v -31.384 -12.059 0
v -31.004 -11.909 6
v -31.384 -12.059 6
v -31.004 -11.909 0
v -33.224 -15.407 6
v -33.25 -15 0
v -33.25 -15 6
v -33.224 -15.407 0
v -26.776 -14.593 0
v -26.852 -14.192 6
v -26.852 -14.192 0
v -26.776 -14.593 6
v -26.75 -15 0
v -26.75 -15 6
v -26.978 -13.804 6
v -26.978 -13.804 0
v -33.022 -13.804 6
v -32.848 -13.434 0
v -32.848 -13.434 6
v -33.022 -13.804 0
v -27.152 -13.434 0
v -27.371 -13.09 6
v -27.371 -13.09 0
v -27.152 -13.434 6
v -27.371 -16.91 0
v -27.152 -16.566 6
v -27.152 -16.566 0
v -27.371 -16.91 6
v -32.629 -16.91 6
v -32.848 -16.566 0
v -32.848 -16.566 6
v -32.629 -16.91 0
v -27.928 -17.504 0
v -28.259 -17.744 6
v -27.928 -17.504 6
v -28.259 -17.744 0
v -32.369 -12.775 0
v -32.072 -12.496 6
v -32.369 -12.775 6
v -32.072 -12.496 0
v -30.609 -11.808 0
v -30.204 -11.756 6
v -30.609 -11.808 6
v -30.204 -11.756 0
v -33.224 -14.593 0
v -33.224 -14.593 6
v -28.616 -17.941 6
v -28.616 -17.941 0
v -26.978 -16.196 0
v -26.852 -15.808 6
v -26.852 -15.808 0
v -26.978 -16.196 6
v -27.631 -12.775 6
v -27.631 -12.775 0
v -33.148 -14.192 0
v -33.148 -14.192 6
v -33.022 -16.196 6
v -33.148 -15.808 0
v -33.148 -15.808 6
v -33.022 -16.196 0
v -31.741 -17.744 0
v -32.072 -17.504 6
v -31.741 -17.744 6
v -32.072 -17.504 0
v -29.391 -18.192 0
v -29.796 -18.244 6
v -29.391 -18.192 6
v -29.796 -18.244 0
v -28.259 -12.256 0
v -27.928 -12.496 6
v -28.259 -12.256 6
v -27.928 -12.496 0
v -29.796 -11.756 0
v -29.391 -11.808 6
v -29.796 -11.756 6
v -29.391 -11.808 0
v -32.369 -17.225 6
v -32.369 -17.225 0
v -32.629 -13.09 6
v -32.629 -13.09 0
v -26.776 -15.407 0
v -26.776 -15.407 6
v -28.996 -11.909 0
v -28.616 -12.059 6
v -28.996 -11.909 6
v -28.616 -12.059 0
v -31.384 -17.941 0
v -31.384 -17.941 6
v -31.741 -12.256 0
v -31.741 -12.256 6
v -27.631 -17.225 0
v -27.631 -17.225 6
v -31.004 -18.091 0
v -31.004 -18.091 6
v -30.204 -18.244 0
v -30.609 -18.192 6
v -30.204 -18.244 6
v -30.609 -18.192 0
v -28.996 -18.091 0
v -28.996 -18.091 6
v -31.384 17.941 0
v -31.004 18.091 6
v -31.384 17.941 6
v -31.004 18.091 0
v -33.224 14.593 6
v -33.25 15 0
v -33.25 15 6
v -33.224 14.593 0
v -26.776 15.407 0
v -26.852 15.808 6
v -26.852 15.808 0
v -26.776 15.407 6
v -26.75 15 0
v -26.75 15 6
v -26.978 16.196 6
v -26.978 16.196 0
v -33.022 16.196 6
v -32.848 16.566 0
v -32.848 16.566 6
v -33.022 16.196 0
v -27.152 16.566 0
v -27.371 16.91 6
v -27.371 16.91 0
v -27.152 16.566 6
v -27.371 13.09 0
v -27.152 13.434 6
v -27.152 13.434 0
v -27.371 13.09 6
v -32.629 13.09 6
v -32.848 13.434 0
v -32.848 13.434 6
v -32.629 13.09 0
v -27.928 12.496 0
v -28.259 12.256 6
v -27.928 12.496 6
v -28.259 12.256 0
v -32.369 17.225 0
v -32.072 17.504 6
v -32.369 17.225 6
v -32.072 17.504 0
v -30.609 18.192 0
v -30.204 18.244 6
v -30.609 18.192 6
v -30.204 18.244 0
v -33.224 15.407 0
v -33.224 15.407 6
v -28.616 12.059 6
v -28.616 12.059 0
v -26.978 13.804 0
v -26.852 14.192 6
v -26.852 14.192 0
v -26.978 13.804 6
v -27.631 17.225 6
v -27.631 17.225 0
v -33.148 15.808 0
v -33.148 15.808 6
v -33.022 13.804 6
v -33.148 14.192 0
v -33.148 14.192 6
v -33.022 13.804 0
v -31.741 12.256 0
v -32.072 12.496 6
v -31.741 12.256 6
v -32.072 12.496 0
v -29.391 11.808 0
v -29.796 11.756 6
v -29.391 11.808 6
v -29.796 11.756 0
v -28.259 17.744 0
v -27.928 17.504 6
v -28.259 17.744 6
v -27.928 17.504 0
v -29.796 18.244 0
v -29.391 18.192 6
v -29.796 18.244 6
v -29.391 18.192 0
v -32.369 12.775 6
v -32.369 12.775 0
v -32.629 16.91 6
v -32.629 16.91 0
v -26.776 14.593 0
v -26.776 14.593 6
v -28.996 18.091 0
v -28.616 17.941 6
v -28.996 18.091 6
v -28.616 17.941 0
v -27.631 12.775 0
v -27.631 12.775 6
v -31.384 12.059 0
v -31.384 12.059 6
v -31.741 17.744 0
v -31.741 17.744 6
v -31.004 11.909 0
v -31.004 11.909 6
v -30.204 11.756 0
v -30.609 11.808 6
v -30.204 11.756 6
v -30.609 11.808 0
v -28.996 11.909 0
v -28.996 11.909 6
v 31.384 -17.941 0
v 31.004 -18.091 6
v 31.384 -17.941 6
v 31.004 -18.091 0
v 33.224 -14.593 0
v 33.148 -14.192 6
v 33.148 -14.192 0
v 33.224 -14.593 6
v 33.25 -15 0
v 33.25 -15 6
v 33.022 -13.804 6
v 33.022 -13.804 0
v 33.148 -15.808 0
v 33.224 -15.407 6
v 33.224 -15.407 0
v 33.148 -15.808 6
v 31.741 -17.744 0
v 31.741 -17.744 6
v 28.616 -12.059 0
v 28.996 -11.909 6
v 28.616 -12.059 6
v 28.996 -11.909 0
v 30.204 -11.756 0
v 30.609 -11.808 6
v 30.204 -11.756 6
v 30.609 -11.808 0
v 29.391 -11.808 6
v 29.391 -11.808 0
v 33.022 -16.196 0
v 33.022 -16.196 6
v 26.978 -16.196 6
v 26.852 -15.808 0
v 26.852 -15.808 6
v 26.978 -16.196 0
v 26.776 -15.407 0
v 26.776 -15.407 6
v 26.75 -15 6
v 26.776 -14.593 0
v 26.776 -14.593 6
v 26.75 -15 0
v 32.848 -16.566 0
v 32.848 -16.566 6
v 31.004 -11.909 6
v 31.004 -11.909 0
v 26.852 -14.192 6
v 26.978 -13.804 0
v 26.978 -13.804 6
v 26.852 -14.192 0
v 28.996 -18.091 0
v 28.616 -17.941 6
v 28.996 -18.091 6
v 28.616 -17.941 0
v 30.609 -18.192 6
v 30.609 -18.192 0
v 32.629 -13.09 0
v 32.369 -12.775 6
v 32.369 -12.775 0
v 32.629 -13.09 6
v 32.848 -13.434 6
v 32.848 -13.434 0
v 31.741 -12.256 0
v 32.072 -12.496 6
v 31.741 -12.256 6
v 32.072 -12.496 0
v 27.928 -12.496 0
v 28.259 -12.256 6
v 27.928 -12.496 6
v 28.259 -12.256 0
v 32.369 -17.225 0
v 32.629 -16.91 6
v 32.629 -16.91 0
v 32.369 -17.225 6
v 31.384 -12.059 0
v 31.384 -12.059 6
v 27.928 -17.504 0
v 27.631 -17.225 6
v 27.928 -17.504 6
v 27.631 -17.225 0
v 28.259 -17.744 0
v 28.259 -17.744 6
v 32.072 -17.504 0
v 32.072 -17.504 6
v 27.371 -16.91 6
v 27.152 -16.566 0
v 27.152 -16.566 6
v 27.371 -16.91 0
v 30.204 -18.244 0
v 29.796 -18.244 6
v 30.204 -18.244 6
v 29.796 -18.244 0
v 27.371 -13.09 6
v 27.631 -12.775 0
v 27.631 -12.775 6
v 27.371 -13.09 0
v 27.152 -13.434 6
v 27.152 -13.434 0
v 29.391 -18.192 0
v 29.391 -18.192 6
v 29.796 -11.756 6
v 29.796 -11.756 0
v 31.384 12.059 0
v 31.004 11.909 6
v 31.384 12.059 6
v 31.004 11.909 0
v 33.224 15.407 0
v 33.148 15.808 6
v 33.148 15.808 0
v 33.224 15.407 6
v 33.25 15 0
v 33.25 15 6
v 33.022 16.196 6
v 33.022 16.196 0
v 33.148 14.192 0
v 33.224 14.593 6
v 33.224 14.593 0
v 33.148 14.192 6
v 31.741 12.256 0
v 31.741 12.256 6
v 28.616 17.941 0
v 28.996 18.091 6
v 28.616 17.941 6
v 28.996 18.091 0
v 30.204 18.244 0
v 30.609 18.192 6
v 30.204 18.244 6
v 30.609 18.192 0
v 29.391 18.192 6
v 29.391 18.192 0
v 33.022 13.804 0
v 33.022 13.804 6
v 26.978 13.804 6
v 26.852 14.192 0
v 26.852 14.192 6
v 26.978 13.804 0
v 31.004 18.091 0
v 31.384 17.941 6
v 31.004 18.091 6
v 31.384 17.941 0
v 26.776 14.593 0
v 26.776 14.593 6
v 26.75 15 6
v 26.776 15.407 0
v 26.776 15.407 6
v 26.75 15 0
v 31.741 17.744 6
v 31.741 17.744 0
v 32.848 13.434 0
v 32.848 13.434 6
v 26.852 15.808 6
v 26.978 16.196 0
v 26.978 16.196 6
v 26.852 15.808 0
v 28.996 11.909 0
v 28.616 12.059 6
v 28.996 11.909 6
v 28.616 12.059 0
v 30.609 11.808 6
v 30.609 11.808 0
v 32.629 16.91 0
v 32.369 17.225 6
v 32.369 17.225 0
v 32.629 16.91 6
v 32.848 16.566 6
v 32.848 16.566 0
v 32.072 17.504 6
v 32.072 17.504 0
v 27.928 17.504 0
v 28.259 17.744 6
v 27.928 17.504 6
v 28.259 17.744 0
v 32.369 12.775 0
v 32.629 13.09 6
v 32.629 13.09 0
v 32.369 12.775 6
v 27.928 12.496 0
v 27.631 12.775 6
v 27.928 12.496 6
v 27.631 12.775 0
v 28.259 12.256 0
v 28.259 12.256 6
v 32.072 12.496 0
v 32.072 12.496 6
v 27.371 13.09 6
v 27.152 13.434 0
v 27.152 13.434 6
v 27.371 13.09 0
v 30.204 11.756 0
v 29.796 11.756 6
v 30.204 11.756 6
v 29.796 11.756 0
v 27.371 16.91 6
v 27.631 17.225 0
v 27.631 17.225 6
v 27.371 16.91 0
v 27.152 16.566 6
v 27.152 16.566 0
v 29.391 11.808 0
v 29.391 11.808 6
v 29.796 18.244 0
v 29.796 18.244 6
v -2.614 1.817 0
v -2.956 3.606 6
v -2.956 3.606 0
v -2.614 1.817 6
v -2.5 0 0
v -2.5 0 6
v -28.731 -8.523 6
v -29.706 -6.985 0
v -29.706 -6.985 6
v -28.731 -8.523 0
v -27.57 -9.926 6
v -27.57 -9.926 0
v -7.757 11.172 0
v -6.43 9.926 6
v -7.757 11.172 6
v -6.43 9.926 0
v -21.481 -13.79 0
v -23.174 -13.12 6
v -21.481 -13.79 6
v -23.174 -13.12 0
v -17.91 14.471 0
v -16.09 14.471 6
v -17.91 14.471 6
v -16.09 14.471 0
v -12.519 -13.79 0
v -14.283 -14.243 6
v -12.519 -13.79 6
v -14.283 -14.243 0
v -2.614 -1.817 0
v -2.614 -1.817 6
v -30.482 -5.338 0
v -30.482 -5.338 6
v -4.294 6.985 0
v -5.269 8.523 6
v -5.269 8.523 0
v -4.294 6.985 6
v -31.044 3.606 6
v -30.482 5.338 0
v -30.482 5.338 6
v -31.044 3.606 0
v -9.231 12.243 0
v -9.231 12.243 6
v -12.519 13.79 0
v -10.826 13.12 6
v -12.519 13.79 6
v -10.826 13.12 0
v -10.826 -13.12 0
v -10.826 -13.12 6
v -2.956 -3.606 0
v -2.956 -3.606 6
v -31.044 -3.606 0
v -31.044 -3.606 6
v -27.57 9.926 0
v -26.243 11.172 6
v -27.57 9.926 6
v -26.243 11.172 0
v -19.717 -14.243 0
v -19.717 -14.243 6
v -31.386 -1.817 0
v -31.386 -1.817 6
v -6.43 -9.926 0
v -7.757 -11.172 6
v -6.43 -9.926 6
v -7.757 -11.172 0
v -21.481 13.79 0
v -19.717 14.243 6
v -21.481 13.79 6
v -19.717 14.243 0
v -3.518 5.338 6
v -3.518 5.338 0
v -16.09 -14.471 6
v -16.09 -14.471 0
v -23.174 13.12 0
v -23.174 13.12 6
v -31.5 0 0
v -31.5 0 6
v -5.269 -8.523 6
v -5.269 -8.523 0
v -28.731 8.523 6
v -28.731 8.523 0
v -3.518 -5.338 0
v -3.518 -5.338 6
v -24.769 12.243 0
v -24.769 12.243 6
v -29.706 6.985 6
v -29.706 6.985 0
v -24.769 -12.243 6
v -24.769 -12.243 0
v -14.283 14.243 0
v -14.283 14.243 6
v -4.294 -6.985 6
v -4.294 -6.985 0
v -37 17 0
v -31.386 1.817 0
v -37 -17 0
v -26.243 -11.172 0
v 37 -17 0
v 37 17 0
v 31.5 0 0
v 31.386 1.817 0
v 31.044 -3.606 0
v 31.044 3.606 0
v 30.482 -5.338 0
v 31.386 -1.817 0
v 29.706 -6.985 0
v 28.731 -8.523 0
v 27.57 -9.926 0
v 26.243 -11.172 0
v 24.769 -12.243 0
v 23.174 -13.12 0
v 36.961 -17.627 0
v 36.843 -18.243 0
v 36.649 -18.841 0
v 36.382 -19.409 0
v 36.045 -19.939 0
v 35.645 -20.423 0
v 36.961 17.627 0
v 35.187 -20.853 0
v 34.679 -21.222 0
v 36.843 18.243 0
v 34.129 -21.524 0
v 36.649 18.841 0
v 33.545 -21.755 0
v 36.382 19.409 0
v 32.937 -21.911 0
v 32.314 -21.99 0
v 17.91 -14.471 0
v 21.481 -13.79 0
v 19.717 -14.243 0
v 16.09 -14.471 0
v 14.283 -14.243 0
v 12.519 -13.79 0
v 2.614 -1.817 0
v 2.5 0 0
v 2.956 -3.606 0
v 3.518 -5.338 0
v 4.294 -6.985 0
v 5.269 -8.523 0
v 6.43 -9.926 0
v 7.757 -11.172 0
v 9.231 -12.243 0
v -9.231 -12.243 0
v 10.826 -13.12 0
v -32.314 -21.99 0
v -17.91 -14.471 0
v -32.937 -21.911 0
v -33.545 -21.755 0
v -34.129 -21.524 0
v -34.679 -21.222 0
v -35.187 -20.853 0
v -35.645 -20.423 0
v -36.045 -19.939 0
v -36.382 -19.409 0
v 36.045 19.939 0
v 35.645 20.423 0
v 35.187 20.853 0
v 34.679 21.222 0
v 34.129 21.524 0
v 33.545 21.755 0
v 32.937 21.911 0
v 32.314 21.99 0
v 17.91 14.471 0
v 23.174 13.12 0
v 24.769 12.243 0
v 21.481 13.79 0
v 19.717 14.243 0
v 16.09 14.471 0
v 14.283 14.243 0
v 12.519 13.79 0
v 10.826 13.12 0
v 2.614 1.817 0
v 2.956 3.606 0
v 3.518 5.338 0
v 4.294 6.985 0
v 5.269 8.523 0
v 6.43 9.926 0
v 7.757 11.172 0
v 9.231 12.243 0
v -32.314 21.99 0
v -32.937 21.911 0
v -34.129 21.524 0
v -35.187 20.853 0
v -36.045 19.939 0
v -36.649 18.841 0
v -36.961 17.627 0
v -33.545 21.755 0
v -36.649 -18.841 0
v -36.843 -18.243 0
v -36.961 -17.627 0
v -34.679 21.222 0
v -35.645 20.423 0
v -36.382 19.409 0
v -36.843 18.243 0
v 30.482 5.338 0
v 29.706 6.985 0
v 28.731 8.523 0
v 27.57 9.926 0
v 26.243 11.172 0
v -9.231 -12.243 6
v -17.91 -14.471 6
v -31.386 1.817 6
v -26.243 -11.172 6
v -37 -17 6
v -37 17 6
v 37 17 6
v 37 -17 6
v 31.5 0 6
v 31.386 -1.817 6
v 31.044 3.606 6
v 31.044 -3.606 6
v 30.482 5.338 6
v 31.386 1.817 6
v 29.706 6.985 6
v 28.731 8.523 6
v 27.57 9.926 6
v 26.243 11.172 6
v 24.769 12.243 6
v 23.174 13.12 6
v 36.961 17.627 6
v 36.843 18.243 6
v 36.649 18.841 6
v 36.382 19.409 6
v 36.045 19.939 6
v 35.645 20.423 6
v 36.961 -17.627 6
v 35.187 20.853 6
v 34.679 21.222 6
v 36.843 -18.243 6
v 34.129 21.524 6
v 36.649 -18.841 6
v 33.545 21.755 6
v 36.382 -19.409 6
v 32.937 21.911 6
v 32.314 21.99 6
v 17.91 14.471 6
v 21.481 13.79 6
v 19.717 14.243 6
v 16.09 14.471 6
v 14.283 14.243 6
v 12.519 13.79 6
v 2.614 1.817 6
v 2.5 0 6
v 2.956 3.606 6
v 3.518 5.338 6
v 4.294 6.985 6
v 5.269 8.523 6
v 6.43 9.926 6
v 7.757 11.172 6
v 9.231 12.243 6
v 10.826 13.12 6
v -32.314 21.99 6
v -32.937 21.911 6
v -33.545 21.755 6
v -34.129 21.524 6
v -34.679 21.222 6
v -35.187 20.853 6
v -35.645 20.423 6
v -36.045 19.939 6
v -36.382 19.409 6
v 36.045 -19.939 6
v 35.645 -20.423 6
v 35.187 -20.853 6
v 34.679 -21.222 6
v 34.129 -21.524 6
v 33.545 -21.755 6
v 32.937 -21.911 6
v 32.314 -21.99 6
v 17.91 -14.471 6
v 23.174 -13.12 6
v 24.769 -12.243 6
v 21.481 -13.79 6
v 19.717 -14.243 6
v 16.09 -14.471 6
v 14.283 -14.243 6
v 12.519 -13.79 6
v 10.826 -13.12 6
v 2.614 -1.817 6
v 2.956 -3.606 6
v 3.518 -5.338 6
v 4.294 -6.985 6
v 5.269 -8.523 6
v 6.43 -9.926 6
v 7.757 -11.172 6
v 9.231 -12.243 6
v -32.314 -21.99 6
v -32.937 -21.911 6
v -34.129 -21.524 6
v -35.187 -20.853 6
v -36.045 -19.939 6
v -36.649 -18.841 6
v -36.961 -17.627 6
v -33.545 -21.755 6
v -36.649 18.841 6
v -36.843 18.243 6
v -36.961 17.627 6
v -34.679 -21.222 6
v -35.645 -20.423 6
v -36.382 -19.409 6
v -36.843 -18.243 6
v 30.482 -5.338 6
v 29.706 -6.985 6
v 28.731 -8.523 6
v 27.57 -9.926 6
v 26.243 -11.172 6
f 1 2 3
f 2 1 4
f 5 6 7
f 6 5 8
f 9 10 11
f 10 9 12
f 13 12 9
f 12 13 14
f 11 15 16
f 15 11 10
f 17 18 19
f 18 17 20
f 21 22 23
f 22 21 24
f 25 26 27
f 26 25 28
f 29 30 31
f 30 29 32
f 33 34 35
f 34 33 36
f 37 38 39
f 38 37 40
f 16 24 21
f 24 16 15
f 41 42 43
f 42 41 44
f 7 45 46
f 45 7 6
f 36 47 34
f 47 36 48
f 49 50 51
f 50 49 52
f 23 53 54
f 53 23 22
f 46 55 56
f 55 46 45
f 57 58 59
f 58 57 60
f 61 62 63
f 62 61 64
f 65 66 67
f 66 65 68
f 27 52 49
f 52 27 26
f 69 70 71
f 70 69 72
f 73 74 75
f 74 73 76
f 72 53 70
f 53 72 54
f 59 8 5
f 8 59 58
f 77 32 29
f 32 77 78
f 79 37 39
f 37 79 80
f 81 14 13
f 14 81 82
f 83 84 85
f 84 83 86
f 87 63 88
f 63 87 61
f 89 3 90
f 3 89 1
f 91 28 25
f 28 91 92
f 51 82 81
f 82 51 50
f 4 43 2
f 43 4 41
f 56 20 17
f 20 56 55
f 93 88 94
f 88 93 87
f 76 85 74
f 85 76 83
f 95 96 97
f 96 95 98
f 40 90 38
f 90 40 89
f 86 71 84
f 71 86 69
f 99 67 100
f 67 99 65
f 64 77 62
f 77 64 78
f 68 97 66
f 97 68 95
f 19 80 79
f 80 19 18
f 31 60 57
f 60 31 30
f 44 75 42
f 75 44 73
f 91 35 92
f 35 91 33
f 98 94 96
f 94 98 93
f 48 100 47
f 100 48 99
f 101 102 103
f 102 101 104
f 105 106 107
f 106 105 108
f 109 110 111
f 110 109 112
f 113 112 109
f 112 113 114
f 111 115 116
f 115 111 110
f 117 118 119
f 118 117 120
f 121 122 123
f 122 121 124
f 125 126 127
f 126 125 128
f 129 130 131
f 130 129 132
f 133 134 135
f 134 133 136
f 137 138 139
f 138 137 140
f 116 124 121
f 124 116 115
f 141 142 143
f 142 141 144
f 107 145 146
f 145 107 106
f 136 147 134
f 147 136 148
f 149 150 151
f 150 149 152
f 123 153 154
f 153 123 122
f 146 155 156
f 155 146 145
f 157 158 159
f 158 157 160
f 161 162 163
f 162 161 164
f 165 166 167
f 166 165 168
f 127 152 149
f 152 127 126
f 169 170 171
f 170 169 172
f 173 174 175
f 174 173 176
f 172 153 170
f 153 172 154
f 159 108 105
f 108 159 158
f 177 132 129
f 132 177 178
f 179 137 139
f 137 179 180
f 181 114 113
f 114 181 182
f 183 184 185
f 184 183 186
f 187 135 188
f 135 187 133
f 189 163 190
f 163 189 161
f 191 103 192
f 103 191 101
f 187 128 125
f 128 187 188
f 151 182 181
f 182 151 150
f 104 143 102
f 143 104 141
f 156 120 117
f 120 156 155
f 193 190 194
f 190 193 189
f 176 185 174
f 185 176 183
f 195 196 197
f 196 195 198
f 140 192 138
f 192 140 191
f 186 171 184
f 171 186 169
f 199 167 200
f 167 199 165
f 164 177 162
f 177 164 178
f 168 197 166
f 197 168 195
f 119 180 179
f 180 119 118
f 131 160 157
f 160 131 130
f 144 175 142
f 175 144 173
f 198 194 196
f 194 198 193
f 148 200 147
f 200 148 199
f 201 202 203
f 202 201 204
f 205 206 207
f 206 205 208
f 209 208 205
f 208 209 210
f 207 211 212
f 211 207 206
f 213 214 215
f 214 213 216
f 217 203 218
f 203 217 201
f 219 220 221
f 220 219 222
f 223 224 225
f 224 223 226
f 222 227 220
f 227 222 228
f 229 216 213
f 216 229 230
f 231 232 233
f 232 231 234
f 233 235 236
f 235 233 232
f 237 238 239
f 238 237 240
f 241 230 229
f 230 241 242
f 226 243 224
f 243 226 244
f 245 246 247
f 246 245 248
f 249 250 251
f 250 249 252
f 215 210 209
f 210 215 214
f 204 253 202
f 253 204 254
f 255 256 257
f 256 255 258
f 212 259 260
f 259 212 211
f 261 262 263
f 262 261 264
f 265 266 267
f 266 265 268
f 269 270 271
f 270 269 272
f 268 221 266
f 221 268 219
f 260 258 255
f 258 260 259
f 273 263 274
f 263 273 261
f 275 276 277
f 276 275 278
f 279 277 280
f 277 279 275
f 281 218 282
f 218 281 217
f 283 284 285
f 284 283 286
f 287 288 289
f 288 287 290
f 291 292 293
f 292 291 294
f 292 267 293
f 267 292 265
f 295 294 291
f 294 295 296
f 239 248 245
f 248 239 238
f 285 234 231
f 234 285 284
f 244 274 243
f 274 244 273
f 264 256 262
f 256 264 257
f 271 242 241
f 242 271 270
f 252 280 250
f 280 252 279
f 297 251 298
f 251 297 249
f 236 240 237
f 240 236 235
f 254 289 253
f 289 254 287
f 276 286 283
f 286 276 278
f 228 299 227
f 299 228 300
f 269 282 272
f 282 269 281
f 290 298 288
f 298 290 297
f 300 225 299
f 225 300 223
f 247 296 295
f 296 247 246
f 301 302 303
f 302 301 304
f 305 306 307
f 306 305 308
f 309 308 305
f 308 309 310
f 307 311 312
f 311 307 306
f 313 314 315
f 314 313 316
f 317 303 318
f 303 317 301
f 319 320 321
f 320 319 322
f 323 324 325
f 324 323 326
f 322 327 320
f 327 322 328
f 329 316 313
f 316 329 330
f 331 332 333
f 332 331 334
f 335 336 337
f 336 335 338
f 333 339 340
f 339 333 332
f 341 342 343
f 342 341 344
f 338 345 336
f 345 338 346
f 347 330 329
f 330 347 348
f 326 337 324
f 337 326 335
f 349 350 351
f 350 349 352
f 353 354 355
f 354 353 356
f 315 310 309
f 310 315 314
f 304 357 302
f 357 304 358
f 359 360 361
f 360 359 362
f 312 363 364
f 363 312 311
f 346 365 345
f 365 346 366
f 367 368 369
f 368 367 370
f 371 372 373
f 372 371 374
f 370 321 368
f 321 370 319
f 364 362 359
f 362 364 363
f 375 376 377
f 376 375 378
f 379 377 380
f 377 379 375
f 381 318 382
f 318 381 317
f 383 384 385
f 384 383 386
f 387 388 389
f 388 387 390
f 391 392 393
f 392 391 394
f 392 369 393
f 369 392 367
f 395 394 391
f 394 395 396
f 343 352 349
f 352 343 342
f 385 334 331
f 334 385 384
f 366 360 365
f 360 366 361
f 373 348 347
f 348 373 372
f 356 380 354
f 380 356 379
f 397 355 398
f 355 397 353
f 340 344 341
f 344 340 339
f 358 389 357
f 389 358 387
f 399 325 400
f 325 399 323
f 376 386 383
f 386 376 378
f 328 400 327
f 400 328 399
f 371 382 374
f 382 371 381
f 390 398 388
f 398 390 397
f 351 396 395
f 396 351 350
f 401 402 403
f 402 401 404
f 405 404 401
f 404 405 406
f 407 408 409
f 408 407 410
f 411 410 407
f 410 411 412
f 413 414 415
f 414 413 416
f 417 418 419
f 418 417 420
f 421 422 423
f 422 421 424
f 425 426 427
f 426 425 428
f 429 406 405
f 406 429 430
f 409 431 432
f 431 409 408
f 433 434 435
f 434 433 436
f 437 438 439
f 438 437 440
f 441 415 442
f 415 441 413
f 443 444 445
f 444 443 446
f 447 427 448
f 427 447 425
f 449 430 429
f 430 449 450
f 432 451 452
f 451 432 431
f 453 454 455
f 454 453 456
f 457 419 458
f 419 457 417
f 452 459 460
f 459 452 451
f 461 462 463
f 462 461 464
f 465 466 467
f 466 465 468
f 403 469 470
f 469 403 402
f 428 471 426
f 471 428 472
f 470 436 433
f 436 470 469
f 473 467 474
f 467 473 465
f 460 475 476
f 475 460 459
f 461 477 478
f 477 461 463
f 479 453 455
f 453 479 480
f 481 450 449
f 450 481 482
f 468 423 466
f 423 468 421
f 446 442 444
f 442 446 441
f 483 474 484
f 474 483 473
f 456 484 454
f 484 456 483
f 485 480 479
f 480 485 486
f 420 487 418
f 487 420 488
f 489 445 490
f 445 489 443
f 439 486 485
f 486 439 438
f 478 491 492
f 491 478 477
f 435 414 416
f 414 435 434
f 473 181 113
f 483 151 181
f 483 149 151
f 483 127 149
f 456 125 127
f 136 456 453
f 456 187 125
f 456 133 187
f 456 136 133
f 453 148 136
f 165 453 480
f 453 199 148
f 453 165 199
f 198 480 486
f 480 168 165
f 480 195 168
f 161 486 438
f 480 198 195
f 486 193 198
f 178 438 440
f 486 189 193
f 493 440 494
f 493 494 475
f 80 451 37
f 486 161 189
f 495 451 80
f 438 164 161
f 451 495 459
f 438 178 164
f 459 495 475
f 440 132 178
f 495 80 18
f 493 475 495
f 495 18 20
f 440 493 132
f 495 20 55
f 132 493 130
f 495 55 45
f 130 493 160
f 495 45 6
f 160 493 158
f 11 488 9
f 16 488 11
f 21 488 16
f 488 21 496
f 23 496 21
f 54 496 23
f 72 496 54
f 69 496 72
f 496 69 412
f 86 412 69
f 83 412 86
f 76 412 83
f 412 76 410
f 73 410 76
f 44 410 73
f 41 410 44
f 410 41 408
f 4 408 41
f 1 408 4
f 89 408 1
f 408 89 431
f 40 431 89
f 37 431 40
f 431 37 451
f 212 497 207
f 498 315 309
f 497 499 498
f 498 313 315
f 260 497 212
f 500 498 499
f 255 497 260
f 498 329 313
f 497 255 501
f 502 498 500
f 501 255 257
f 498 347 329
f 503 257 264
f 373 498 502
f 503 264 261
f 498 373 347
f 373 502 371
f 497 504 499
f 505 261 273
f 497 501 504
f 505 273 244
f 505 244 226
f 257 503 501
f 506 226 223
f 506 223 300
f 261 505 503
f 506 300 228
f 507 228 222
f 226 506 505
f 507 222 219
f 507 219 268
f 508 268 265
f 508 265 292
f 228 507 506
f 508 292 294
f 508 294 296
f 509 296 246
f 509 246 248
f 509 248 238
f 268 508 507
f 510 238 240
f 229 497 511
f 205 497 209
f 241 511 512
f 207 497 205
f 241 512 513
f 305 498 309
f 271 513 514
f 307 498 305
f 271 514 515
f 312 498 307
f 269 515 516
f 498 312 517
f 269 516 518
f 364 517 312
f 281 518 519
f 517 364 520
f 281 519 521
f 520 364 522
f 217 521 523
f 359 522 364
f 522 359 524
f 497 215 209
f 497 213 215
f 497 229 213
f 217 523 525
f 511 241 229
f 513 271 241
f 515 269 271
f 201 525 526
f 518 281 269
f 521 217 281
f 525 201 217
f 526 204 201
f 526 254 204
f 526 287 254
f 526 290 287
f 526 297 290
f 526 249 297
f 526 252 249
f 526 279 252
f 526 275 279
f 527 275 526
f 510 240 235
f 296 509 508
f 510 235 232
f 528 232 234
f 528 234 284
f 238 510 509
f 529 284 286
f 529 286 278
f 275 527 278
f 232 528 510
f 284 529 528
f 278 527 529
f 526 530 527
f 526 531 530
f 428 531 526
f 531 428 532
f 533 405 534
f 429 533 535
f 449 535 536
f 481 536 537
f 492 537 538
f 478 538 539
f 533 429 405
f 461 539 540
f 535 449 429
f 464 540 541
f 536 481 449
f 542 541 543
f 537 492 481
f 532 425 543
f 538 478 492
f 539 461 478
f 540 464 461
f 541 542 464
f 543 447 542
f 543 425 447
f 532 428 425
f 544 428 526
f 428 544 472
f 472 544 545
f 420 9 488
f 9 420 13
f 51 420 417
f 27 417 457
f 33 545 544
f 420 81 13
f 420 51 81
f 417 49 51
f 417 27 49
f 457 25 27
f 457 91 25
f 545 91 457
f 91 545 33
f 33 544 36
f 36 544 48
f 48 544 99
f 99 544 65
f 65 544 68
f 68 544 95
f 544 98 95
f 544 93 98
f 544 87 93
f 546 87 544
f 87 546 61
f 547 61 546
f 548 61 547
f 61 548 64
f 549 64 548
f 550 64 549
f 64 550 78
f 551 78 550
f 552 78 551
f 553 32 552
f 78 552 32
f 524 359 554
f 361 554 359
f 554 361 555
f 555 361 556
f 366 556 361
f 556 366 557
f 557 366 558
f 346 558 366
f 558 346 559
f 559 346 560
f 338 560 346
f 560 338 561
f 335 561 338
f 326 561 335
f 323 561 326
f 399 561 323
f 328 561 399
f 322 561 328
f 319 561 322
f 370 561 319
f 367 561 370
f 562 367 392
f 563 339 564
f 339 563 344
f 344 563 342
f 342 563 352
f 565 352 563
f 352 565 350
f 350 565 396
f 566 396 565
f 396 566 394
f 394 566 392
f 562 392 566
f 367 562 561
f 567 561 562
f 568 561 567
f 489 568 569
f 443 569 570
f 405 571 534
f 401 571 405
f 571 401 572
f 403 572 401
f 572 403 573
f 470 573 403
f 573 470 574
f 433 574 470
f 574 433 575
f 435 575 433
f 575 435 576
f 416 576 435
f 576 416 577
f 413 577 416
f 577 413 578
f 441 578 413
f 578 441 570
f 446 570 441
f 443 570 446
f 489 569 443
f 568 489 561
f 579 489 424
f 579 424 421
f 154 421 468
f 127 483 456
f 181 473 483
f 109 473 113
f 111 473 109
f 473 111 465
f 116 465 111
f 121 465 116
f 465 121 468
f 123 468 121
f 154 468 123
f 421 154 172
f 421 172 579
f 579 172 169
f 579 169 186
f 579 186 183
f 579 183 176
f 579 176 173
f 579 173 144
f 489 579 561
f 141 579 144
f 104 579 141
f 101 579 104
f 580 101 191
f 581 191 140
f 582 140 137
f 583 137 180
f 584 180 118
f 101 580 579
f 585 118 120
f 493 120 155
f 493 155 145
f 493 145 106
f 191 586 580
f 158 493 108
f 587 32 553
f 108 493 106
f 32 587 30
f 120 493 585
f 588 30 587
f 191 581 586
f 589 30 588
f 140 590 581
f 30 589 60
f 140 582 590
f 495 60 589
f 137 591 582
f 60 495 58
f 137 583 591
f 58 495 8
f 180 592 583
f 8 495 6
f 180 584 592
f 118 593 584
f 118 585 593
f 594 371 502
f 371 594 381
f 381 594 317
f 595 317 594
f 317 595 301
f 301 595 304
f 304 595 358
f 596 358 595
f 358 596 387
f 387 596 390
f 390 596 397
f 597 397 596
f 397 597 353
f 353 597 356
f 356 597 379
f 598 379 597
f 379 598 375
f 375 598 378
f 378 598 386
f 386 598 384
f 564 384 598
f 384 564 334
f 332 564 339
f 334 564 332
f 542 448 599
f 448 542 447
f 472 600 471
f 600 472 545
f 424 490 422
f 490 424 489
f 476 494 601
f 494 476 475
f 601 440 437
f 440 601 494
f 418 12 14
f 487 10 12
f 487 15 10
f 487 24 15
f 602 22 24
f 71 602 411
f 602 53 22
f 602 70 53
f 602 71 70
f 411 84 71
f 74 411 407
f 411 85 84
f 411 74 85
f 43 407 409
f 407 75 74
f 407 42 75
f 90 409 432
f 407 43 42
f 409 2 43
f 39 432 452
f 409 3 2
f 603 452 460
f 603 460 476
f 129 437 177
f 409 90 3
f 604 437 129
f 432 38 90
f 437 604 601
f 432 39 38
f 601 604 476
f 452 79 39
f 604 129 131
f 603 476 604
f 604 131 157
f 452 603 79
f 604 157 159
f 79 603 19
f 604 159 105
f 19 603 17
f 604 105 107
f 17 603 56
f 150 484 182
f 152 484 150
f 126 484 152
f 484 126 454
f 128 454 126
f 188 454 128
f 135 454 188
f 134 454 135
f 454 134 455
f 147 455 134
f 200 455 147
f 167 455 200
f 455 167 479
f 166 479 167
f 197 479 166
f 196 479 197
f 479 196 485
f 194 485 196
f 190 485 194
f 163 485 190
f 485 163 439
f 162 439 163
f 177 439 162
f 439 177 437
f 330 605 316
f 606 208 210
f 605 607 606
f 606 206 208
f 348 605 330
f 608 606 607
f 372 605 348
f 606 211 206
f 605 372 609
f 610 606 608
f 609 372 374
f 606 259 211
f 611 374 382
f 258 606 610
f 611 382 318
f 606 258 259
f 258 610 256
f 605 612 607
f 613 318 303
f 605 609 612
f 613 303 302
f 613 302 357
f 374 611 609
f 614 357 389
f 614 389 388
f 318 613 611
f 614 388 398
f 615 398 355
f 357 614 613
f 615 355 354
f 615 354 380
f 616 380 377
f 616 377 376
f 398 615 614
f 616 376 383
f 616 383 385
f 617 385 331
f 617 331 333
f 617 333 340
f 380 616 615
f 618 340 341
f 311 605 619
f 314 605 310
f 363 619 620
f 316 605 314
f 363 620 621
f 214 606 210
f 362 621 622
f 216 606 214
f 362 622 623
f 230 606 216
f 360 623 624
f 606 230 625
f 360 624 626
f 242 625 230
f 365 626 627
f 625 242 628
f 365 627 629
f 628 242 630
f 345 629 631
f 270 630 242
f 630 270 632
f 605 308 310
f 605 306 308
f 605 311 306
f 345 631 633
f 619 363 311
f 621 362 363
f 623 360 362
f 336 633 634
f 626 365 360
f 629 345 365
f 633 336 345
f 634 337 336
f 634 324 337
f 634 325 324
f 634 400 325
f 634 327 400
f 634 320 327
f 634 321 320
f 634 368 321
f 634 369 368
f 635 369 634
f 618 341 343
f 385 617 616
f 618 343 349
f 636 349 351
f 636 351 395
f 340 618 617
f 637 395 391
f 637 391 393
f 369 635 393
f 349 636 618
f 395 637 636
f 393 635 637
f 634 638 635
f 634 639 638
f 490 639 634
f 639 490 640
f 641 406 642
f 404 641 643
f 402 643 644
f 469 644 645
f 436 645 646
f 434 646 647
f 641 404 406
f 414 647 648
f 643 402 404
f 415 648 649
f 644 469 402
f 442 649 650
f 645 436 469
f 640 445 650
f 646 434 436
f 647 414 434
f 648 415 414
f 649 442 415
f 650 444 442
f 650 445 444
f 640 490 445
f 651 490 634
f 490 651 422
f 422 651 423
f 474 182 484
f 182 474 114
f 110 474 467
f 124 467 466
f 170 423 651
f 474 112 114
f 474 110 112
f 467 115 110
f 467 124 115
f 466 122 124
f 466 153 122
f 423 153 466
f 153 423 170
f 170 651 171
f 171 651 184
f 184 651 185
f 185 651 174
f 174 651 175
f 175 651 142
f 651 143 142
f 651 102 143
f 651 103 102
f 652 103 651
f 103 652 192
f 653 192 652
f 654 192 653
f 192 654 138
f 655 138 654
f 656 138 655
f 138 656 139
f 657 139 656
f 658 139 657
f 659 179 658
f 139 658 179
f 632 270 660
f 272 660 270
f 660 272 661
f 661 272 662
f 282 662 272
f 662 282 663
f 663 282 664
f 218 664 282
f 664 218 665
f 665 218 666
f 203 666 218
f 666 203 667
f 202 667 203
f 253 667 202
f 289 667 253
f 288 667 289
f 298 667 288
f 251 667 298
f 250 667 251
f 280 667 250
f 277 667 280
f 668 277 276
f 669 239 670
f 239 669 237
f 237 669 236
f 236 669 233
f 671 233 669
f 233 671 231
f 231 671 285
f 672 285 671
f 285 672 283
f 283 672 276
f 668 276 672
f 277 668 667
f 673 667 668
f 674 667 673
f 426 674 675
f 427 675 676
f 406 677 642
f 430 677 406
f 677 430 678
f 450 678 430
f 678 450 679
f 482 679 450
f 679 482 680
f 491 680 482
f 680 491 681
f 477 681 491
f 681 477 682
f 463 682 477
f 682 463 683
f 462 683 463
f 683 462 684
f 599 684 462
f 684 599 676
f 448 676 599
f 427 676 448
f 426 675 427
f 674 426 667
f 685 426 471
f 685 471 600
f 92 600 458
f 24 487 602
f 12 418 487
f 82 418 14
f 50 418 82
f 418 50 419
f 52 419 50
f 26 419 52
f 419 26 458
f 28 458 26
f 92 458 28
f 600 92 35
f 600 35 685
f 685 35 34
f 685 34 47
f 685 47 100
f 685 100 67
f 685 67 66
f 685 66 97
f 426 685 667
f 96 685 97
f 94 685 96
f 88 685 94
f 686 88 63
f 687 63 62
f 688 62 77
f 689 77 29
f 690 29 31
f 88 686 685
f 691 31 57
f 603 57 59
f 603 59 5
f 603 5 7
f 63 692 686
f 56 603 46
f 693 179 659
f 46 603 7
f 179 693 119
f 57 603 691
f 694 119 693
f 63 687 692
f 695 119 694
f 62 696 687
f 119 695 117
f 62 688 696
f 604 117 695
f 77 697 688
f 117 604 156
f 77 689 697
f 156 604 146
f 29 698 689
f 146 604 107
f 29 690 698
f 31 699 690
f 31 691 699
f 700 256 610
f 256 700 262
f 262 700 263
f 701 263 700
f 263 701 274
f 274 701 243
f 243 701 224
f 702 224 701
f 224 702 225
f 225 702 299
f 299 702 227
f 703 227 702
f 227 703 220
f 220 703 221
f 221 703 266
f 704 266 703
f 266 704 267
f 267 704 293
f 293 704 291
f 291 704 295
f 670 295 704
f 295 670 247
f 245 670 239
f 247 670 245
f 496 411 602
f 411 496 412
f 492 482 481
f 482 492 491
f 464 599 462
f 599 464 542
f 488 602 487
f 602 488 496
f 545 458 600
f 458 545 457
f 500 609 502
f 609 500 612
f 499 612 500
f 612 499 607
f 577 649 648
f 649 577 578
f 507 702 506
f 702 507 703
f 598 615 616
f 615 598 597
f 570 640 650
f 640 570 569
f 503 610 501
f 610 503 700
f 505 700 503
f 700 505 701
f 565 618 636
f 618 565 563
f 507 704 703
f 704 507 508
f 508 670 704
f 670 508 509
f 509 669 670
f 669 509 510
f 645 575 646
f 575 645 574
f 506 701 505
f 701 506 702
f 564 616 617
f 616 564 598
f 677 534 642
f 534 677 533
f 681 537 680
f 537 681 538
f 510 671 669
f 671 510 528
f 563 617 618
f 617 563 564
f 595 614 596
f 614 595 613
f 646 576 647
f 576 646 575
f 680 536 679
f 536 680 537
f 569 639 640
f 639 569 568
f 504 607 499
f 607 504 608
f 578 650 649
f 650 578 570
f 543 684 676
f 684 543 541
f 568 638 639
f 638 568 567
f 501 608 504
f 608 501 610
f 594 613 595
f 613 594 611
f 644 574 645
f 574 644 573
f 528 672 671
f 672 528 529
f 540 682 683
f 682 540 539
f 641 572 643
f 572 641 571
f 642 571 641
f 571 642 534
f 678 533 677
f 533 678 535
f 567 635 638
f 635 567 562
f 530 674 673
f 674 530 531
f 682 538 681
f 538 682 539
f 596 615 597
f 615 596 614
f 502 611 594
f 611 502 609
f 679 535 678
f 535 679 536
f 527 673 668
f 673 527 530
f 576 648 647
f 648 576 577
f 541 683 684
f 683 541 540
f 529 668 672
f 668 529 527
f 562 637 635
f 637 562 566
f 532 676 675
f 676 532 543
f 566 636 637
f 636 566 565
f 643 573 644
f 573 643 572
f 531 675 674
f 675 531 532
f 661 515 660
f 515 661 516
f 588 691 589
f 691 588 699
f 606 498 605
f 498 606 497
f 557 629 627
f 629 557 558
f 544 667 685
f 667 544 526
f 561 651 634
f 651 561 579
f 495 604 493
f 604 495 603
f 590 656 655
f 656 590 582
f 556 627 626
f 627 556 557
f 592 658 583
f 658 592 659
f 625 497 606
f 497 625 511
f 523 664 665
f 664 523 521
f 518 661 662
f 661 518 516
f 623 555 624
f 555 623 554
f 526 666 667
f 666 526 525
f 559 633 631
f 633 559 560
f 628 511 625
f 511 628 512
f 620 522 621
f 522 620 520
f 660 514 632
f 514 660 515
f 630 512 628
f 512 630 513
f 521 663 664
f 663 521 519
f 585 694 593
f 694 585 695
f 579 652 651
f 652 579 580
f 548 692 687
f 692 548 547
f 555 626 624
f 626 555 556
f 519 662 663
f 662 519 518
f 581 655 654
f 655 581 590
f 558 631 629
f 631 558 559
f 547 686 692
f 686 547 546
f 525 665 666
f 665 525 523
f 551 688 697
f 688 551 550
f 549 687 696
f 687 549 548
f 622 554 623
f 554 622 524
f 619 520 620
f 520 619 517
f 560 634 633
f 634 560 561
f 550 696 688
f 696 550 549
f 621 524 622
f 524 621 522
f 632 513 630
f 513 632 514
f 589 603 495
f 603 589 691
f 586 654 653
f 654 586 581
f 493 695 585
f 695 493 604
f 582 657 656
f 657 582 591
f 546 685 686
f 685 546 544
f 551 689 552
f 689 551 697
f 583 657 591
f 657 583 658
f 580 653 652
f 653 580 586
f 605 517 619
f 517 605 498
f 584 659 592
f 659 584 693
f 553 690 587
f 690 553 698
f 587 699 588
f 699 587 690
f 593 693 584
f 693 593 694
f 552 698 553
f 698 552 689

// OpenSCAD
$fn = 50;

difference() {
	union() {
		hull() {
			translate(v = [-32.0, 17.0, 0]) {
				cylinder(h = 6, r = 5);
			}
			translate(v = [32.0, 17.0, 0]) {
				cylinder(h = 6, r = 5);
			}
			translate(v = [-32.0, -17.0, 0]) {
				cylinder(h = 6, r = 5);
			}
			translate(v = [32.0, -17.0, 0]) {
				cylinder(h = 6, r = 5);
			}
		}
	}
	union() {
		translate(v = [-30.0, -15.0, -100.0]) {
			cylinder(h = 200, r = 3.25);
		}
		translate(v = [-30.0, 15.0, -100.0]) {
			cylinder(h = 200, r = 3.25);
		}
		translate(v = [30.0, -15.0, -100.0]) {
			cylinder(h = 200, r = 3.25);
		}
		translate(v = [30.0, 15.0, -100.0]) {
			cylinder(h = 200, r = 3.25);
		}
		translate(v = [-30.0, -15.0, -100.0]) {
			cylinder(h = 200, r = 1.8);
		}
		translate(v = [-30.0, 15.0, -100.0]) {
			cylinder(h = 200, r = 1.8);
		}
		translate(v = [30.0, -15.0, -100.0]) {
			cylinder(h = 200, r = 1.8);
		}
		translate(v = [30.0, 15.0, -100.0]) {
			cylinder(h = 200, r = 1.8);
		}
		translate(v = [-17.0, 0, 0.0]) {
			cylinder(h = 6, r = 14.5);
		}
		translate(v = [17.0, 0, 0.0]) {
			cylinder(h = 6, r = 14.5);
		}
	}
}
